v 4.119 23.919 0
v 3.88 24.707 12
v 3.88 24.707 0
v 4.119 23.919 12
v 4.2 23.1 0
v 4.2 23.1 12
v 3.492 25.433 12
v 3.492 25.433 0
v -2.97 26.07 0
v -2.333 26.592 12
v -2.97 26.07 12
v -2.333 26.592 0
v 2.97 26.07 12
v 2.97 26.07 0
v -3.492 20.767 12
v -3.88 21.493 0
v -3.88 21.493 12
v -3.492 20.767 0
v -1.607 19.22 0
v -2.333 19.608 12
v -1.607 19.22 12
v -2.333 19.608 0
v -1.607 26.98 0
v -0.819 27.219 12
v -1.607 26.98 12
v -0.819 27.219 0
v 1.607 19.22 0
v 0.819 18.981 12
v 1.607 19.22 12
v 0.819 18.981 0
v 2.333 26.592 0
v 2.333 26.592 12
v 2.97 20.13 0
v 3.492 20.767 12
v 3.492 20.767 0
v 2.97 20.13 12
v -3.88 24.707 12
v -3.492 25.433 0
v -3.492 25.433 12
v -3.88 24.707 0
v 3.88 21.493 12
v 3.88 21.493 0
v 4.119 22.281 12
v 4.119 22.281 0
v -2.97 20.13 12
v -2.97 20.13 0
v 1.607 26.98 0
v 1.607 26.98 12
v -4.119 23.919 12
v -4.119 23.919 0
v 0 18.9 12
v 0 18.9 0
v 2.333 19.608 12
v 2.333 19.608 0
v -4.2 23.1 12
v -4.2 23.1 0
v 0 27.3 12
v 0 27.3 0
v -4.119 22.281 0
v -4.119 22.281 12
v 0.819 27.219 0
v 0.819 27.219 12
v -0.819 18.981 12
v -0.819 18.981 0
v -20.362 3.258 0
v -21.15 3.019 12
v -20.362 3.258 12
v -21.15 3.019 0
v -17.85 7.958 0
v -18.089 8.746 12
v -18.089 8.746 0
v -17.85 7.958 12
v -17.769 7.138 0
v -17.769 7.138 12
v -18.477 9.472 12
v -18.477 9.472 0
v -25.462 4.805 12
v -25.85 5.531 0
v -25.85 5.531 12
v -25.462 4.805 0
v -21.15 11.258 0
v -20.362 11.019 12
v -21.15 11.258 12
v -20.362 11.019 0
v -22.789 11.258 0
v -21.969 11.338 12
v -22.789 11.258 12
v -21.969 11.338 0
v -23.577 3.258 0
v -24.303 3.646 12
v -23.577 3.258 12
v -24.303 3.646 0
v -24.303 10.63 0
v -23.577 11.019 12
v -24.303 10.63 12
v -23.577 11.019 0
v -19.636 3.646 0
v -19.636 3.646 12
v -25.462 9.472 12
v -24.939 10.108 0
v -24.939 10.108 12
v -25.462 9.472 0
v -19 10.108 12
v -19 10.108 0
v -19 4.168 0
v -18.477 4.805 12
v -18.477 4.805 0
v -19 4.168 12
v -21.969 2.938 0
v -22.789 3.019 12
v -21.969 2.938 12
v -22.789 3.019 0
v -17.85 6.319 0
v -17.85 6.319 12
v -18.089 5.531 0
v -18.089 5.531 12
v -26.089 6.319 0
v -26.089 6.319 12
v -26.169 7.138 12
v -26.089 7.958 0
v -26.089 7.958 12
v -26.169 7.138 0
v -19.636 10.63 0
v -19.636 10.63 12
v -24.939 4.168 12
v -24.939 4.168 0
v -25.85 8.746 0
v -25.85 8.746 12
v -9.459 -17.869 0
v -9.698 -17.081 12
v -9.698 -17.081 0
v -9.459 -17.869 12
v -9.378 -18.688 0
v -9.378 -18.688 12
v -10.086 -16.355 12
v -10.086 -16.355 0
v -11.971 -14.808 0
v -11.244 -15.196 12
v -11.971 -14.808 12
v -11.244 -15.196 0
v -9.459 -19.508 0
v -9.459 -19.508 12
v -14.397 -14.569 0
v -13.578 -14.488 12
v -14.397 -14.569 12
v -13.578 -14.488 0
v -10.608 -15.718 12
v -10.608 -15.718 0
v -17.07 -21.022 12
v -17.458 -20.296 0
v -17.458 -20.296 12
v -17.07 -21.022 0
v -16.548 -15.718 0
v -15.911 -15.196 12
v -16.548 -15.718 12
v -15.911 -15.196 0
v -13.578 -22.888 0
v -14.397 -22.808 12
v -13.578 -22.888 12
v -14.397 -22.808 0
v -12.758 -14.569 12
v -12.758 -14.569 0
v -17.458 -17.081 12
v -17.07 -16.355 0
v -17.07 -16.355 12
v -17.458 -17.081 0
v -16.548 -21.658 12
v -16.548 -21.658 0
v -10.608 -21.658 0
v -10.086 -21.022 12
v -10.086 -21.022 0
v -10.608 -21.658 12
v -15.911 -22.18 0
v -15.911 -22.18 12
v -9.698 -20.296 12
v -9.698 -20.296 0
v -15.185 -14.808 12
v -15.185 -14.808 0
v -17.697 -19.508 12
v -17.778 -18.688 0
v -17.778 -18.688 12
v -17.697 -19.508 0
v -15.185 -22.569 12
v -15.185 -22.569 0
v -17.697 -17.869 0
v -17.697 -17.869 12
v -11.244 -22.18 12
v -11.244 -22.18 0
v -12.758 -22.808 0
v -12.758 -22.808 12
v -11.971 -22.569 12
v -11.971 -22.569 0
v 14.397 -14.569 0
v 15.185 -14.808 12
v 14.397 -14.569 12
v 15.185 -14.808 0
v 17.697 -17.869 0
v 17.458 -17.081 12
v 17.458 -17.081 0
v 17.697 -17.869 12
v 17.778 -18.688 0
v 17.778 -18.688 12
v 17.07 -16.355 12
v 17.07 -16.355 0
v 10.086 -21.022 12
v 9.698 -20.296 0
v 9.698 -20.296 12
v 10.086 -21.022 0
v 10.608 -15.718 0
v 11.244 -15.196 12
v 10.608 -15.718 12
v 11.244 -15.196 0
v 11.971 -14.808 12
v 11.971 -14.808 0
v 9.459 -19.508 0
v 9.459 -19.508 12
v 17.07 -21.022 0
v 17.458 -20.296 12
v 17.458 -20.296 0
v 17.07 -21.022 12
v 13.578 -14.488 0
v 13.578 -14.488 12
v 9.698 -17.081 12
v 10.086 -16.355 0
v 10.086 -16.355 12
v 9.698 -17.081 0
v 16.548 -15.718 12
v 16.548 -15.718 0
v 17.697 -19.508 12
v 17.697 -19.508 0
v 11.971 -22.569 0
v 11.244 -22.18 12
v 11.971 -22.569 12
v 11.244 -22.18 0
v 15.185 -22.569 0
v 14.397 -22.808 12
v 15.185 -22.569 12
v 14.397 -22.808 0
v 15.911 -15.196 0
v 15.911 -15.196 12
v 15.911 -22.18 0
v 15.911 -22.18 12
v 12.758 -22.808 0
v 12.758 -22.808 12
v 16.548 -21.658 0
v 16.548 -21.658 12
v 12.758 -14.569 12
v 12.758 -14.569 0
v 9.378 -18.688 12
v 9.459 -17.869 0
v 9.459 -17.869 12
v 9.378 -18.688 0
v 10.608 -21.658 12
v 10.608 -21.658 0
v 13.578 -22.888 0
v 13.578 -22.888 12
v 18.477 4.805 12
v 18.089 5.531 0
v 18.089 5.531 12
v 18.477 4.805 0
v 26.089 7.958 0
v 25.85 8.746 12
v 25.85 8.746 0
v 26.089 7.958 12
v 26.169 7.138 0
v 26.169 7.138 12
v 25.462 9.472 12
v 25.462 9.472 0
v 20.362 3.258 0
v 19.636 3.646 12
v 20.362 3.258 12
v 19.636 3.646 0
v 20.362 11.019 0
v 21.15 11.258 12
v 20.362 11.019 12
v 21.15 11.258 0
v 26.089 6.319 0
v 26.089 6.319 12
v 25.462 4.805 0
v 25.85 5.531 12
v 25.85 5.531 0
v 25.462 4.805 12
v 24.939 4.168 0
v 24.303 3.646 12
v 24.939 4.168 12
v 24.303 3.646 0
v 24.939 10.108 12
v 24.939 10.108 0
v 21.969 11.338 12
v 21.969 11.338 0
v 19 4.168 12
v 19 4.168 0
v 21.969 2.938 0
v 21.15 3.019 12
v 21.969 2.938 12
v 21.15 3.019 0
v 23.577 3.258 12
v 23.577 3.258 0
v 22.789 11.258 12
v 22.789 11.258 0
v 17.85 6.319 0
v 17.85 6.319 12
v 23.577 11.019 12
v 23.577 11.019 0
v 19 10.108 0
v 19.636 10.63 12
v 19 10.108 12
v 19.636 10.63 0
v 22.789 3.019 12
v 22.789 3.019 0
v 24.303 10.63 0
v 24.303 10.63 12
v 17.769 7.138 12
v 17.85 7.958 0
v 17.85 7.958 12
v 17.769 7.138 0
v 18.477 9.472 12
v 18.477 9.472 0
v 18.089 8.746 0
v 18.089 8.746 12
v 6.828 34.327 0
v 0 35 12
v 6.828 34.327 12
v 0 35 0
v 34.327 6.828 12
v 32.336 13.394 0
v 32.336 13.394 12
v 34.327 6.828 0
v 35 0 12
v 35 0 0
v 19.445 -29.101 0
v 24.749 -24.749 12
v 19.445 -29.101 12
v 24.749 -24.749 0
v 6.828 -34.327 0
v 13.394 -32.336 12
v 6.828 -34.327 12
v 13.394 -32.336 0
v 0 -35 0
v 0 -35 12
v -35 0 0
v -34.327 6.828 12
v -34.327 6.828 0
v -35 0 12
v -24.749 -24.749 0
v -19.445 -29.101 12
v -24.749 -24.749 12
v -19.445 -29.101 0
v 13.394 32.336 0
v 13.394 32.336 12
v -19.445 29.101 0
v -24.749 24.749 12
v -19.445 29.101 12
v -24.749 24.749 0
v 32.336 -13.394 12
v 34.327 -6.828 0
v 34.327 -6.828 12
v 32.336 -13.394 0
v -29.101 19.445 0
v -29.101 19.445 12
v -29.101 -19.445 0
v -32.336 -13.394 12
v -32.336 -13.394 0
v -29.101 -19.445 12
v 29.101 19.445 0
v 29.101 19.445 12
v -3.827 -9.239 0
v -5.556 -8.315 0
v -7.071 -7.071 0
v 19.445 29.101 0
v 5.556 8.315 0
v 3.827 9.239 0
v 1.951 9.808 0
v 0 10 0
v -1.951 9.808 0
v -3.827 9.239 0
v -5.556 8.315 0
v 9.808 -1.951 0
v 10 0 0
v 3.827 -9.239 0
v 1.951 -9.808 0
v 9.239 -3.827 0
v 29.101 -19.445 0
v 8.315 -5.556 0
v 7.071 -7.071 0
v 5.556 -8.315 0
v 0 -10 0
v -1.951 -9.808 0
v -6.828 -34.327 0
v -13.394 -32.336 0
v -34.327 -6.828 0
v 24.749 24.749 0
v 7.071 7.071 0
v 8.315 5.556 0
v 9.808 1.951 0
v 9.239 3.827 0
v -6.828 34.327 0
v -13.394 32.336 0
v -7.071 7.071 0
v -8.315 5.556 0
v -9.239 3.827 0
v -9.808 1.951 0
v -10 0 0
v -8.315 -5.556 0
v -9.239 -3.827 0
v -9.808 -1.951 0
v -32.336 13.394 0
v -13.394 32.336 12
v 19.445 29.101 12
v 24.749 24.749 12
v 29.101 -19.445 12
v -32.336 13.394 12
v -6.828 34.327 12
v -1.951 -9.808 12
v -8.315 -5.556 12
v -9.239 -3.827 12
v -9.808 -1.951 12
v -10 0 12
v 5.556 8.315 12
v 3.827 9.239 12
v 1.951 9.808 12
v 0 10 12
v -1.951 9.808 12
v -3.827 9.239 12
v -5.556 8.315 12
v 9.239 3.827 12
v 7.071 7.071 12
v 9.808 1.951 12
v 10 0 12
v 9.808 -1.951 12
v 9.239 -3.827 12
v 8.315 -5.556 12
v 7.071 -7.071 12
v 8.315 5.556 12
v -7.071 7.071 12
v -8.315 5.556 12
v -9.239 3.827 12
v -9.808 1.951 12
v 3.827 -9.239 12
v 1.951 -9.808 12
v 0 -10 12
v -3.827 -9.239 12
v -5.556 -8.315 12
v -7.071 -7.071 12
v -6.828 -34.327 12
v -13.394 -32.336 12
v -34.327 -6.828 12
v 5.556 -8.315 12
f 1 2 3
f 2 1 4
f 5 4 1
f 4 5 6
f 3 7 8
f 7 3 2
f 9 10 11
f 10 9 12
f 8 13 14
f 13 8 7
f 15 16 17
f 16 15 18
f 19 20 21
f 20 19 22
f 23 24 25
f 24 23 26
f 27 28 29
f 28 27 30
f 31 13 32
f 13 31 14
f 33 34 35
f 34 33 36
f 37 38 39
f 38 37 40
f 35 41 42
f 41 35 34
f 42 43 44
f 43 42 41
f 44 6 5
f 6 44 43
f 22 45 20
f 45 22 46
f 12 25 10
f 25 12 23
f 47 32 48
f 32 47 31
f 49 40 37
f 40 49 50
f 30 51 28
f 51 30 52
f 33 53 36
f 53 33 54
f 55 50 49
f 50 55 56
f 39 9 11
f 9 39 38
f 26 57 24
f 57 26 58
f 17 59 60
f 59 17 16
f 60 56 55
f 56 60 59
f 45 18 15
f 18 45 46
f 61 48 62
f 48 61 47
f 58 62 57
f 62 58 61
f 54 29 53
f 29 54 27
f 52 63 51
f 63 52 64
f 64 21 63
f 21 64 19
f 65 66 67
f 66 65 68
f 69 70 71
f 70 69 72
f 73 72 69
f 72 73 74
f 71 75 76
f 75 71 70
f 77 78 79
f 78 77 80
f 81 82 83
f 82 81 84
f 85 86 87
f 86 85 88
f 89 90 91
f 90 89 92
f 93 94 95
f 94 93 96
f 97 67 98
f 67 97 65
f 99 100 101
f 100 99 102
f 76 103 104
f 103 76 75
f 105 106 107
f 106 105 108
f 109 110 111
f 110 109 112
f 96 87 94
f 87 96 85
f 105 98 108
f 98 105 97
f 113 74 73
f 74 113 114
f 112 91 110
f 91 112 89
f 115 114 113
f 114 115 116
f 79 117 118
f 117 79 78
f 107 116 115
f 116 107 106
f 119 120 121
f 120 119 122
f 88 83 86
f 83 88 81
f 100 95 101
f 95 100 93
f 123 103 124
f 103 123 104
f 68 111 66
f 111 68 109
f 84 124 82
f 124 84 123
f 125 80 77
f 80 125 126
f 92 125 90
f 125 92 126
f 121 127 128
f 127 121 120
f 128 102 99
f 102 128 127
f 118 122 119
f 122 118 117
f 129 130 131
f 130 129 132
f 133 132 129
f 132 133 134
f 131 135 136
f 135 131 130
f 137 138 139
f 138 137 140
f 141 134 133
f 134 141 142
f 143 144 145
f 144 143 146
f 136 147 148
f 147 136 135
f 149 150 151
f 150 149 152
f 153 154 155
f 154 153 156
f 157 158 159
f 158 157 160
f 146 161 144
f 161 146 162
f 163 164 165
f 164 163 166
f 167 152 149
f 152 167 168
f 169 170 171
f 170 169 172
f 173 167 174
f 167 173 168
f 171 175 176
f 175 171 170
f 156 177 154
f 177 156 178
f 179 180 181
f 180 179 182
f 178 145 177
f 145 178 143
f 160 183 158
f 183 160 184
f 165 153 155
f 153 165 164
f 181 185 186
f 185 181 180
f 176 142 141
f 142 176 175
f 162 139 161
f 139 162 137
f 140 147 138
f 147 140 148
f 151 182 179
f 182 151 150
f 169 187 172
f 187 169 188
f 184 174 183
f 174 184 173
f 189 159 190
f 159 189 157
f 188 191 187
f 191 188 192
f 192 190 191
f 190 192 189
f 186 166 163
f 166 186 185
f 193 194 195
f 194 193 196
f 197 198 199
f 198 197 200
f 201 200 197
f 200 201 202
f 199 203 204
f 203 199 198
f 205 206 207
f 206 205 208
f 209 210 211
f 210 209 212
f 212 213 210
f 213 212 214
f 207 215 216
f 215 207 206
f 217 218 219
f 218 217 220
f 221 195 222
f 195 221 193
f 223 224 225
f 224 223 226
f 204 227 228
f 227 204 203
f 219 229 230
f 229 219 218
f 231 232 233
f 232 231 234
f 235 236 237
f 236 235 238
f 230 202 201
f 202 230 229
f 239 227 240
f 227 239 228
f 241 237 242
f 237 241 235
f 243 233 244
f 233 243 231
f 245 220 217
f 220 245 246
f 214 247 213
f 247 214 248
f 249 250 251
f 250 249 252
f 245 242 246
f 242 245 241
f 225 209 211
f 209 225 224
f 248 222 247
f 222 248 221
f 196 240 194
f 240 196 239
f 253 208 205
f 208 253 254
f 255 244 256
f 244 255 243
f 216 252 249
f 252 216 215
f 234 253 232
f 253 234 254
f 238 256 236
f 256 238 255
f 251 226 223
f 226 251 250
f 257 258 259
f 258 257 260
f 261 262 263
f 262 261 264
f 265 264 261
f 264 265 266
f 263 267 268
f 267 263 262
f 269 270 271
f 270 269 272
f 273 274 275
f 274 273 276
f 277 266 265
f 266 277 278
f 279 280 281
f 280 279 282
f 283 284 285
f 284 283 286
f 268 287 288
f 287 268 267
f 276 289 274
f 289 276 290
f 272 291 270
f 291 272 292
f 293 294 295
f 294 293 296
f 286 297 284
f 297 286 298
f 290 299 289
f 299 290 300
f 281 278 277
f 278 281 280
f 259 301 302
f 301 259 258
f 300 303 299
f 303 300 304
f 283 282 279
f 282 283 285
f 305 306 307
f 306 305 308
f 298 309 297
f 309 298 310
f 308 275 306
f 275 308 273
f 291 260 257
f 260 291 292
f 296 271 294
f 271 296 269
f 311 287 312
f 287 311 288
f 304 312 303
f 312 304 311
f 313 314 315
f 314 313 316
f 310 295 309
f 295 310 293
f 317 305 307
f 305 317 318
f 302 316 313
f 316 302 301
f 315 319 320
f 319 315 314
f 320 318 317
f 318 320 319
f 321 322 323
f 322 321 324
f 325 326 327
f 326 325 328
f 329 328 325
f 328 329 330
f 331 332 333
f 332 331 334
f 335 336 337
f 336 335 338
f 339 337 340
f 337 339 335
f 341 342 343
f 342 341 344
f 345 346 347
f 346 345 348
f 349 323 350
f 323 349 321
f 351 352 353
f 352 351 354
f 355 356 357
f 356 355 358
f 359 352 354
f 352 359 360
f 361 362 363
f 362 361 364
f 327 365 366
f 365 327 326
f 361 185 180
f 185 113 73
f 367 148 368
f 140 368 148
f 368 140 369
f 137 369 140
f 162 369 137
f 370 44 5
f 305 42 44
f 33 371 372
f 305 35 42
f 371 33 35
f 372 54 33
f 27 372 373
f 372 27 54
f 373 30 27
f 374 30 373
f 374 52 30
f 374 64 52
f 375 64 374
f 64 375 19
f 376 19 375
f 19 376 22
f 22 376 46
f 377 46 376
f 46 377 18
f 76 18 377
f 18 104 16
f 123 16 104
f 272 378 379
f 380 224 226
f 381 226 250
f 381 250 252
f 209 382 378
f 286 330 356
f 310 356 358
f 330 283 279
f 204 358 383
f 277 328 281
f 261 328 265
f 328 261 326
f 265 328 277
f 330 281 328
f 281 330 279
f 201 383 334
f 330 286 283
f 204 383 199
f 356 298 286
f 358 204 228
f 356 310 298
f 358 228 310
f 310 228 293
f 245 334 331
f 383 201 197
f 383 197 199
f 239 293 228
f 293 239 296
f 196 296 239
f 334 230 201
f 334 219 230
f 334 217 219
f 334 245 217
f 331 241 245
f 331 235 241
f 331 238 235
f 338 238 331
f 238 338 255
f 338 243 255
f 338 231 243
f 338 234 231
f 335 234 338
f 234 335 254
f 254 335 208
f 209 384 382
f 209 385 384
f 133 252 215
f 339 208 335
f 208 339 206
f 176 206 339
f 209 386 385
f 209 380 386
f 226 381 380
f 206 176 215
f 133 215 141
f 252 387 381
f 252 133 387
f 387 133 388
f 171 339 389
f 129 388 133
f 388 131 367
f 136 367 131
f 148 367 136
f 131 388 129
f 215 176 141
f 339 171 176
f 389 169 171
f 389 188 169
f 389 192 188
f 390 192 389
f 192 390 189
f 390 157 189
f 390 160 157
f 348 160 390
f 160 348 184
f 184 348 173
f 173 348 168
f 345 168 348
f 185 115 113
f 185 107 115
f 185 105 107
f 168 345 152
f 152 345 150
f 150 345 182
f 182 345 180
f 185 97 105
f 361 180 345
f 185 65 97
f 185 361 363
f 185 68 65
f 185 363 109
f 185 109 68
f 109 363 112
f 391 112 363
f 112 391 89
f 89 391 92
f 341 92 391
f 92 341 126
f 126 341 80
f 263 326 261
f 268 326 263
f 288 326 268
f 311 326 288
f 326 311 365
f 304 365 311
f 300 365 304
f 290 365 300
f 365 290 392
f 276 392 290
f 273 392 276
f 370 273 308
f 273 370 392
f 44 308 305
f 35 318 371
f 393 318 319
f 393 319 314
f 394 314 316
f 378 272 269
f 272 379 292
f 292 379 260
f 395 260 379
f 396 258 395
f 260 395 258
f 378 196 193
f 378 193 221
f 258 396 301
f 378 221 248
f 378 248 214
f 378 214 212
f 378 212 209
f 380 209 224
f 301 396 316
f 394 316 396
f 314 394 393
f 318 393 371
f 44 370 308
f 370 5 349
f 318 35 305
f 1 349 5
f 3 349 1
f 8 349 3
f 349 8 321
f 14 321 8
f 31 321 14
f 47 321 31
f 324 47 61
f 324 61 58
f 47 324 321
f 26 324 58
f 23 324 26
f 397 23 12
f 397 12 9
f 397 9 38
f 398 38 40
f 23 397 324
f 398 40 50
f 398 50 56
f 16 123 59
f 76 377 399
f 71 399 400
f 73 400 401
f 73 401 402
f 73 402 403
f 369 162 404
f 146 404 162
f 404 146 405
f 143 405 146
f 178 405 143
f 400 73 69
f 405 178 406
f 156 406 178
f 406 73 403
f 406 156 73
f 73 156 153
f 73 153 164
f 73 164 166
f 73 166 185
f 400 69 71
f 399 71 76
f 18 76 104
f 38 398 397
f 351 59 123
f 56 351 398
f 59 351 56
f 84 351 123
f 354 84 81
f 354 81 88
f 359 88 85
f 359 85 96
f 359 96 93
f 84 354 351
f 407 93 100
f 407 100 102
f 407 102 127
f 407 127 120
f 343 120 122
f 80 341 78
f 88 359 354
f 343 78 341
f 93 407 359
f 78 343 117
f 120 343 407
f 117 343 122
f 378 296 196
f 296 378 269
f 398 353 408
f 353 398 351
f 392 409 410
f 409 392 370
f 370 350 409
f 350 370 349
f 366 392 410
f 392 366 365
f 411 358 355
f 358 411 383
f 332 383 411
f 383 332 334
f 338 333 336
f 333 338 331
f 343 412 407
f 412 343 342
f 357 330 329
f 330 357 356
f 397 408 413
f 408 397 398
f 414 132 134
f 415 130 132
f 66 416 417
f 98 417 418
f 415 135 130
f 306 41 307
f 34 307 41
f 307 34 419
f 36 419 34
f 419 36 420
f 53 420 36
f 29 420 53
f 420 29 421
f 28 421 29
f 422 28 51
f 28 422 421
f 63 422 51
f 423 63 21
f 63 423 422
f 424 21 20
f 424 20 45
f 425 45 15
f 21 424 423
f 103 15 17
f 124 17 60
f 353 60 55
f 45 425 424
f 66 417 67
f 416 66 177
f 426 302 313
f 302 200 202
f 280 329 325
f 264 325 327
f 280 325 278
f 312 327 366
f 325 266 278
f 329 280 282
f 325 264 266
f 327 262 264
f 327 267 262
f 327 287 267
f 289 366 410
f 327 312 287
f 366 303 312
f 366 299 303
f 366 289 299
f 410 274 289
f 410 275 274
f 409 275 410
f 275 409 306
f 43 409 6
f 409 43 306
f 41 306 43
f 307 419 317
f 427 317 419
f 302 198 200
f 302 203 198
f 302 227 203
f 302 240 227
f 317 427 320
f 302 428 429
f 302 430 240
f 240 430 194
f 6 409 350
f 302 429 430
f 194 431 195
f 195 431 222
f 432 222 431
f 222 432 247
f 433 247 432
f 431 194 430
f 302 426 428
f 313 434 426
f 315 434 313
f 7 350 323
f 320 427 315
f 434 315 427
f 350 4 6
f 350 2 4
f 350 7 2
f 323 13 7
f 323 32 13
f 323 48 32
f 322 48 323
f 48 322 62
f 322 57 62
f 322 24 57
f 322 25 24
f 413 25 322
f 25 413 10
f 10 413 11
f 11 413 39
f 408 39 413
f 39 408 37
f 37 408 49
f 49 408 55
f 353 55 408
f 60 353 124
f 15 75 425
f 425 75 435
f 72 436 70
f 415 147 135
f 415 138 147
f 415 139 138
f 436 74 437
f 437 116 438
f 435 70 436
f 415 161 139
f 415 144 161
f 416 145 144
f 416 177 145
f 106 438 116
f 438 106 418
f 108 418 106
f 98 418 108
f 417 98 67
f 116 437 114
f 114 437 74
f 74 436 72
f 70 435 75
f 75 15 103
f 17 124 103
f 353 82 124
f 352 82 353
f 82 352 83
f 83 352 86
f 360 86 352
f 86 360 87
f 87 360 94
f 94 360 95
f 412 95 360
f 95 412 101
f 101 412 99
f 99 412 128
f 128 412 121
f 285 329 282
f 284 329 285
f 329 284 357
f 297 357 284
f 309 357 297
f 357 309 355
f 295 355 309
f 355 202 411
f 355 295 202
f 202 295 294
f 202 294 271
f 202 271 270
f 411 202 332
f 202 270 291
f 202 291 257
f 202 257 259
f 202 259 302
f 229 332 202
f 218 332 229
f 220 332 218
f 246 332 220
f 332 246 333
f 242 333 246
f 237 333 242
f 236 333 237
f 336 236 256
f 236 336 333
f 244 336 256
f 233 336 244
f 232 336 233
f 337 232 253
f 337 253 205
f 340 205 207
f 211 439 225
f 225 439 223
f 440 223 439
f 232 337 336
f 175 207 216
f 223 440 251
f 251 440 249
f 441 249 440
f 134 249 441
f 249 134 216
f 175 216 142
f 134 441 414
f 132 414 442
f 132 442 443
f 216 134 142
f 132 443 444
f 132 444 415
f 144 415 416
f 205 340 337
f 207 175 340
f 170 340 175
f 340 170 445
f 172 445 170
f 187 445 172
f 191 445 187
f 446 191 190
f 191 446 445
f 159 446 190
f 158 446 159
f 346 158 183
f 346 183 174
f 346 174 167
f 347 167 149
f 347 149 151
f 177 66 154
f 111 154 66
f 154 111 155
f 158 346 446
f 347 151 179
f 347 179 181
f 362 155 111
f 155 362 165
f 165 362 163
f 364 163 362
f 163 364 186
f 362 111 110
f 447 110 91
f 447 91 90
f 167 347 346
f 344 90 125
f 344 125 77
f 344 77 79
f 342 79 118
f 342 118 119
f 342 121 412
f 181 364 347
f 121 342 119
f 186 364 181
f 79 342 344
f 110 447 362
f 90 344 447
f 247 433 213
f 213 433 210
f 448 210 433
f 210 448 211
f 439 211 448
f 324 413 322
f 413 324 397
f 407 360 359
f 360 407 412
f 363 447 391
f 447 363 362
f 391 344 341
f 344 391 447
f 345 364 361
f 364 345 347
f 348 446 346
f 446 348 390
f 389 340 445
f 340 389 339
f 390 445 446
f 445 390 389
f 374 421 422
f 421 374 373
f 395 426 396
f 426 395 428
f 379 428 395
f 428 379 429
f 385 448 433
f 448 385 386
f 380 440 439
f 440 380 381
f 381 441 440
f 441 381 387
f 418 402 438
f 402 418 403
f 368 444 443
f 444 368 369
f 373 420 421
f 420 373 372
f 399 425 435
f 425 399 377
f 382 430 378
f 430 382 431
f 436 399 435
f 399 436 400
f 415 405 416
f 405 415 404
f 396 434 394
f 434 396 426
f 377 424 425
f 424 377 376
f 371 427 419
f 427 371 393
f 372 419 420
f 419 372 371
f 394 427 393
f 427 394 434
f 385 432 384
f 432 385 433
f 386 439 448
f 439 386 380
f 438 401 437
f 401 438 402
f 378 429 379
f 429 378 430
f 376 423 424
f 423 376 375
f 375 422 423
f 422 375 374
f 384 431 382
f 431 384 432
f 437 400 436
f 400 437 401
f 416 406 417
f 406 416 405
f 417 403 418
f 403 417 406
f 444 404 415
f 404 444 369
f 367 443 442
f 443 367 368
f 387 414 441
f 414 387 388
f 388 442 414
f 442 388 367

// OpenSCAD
$fn = 32;

// ----------------------------------------------------------------------
// Flange Ø70 x 12
// 5 holes on a Ø46.2 bolt circle, bolted joints
// ----------------------------------------------------------------------

// --- parameters (mm) ---
flange_d = 70;   // outside diameter of the flange
thickness = 12;  // flange thickness
holes = 5;       // number of bolt holes
pcd = 46.2;      // bolt circle diameter
start_deg = 90;  // angle of the first hole, from +X
hole_d = 8.4;    // bolt hole diameter
bore_d = 20;     // central through bore
hub_d = 30;      // hub outside diameter
hub_h = 0;       // hub height above the flange face (0 = no hub)

// --- derived feature positions (mm) ---
height = thickness + hub_h;  // = 12   overall height of the part
pcd_r = pcd / 2;             // = 23.1   bolt circle radius
hole_step = 360 / holes;     // = 72   angular pitch
feature_centers = [
  [pcd_r * cos(start_deg + 0 * hole_step), pcd_r * sin(start_deg + 0 * hole_step)],
  [pcd_r * cos(start_deg + 1 * hole_step), pcd_r * sin(start_deg + 1 * hole_step)],
  [pcd_r * cos(start_deg + 2 * hole_step), pcd_r * sin(start_deg + 2 * hole_step)],
  [pcd_r * cos(start_deg + 3 * hole_step), pcd_r * sin(start_deg + 3 * hole_step)],
  [pcd_r * cos(start_deg + 4 * hole_step), pcd_r * sin(start_deg + 4 * hole_step)]
];   // bolt hole centres on the pitch circle

// flange disc, every hole and the bore cut straight through
difference() {
  union() {
    cylinder(d = flange_d, h = thickness);
  }
  translate([0, 0, -1]) cylinder(d = bore_d, h = height + 2);  // bore, through
  for (centre = feature_centers)
    translate([centre[0], centre[1], -1]) cylinder(d = hole_d, h = thickness + 2);
}
